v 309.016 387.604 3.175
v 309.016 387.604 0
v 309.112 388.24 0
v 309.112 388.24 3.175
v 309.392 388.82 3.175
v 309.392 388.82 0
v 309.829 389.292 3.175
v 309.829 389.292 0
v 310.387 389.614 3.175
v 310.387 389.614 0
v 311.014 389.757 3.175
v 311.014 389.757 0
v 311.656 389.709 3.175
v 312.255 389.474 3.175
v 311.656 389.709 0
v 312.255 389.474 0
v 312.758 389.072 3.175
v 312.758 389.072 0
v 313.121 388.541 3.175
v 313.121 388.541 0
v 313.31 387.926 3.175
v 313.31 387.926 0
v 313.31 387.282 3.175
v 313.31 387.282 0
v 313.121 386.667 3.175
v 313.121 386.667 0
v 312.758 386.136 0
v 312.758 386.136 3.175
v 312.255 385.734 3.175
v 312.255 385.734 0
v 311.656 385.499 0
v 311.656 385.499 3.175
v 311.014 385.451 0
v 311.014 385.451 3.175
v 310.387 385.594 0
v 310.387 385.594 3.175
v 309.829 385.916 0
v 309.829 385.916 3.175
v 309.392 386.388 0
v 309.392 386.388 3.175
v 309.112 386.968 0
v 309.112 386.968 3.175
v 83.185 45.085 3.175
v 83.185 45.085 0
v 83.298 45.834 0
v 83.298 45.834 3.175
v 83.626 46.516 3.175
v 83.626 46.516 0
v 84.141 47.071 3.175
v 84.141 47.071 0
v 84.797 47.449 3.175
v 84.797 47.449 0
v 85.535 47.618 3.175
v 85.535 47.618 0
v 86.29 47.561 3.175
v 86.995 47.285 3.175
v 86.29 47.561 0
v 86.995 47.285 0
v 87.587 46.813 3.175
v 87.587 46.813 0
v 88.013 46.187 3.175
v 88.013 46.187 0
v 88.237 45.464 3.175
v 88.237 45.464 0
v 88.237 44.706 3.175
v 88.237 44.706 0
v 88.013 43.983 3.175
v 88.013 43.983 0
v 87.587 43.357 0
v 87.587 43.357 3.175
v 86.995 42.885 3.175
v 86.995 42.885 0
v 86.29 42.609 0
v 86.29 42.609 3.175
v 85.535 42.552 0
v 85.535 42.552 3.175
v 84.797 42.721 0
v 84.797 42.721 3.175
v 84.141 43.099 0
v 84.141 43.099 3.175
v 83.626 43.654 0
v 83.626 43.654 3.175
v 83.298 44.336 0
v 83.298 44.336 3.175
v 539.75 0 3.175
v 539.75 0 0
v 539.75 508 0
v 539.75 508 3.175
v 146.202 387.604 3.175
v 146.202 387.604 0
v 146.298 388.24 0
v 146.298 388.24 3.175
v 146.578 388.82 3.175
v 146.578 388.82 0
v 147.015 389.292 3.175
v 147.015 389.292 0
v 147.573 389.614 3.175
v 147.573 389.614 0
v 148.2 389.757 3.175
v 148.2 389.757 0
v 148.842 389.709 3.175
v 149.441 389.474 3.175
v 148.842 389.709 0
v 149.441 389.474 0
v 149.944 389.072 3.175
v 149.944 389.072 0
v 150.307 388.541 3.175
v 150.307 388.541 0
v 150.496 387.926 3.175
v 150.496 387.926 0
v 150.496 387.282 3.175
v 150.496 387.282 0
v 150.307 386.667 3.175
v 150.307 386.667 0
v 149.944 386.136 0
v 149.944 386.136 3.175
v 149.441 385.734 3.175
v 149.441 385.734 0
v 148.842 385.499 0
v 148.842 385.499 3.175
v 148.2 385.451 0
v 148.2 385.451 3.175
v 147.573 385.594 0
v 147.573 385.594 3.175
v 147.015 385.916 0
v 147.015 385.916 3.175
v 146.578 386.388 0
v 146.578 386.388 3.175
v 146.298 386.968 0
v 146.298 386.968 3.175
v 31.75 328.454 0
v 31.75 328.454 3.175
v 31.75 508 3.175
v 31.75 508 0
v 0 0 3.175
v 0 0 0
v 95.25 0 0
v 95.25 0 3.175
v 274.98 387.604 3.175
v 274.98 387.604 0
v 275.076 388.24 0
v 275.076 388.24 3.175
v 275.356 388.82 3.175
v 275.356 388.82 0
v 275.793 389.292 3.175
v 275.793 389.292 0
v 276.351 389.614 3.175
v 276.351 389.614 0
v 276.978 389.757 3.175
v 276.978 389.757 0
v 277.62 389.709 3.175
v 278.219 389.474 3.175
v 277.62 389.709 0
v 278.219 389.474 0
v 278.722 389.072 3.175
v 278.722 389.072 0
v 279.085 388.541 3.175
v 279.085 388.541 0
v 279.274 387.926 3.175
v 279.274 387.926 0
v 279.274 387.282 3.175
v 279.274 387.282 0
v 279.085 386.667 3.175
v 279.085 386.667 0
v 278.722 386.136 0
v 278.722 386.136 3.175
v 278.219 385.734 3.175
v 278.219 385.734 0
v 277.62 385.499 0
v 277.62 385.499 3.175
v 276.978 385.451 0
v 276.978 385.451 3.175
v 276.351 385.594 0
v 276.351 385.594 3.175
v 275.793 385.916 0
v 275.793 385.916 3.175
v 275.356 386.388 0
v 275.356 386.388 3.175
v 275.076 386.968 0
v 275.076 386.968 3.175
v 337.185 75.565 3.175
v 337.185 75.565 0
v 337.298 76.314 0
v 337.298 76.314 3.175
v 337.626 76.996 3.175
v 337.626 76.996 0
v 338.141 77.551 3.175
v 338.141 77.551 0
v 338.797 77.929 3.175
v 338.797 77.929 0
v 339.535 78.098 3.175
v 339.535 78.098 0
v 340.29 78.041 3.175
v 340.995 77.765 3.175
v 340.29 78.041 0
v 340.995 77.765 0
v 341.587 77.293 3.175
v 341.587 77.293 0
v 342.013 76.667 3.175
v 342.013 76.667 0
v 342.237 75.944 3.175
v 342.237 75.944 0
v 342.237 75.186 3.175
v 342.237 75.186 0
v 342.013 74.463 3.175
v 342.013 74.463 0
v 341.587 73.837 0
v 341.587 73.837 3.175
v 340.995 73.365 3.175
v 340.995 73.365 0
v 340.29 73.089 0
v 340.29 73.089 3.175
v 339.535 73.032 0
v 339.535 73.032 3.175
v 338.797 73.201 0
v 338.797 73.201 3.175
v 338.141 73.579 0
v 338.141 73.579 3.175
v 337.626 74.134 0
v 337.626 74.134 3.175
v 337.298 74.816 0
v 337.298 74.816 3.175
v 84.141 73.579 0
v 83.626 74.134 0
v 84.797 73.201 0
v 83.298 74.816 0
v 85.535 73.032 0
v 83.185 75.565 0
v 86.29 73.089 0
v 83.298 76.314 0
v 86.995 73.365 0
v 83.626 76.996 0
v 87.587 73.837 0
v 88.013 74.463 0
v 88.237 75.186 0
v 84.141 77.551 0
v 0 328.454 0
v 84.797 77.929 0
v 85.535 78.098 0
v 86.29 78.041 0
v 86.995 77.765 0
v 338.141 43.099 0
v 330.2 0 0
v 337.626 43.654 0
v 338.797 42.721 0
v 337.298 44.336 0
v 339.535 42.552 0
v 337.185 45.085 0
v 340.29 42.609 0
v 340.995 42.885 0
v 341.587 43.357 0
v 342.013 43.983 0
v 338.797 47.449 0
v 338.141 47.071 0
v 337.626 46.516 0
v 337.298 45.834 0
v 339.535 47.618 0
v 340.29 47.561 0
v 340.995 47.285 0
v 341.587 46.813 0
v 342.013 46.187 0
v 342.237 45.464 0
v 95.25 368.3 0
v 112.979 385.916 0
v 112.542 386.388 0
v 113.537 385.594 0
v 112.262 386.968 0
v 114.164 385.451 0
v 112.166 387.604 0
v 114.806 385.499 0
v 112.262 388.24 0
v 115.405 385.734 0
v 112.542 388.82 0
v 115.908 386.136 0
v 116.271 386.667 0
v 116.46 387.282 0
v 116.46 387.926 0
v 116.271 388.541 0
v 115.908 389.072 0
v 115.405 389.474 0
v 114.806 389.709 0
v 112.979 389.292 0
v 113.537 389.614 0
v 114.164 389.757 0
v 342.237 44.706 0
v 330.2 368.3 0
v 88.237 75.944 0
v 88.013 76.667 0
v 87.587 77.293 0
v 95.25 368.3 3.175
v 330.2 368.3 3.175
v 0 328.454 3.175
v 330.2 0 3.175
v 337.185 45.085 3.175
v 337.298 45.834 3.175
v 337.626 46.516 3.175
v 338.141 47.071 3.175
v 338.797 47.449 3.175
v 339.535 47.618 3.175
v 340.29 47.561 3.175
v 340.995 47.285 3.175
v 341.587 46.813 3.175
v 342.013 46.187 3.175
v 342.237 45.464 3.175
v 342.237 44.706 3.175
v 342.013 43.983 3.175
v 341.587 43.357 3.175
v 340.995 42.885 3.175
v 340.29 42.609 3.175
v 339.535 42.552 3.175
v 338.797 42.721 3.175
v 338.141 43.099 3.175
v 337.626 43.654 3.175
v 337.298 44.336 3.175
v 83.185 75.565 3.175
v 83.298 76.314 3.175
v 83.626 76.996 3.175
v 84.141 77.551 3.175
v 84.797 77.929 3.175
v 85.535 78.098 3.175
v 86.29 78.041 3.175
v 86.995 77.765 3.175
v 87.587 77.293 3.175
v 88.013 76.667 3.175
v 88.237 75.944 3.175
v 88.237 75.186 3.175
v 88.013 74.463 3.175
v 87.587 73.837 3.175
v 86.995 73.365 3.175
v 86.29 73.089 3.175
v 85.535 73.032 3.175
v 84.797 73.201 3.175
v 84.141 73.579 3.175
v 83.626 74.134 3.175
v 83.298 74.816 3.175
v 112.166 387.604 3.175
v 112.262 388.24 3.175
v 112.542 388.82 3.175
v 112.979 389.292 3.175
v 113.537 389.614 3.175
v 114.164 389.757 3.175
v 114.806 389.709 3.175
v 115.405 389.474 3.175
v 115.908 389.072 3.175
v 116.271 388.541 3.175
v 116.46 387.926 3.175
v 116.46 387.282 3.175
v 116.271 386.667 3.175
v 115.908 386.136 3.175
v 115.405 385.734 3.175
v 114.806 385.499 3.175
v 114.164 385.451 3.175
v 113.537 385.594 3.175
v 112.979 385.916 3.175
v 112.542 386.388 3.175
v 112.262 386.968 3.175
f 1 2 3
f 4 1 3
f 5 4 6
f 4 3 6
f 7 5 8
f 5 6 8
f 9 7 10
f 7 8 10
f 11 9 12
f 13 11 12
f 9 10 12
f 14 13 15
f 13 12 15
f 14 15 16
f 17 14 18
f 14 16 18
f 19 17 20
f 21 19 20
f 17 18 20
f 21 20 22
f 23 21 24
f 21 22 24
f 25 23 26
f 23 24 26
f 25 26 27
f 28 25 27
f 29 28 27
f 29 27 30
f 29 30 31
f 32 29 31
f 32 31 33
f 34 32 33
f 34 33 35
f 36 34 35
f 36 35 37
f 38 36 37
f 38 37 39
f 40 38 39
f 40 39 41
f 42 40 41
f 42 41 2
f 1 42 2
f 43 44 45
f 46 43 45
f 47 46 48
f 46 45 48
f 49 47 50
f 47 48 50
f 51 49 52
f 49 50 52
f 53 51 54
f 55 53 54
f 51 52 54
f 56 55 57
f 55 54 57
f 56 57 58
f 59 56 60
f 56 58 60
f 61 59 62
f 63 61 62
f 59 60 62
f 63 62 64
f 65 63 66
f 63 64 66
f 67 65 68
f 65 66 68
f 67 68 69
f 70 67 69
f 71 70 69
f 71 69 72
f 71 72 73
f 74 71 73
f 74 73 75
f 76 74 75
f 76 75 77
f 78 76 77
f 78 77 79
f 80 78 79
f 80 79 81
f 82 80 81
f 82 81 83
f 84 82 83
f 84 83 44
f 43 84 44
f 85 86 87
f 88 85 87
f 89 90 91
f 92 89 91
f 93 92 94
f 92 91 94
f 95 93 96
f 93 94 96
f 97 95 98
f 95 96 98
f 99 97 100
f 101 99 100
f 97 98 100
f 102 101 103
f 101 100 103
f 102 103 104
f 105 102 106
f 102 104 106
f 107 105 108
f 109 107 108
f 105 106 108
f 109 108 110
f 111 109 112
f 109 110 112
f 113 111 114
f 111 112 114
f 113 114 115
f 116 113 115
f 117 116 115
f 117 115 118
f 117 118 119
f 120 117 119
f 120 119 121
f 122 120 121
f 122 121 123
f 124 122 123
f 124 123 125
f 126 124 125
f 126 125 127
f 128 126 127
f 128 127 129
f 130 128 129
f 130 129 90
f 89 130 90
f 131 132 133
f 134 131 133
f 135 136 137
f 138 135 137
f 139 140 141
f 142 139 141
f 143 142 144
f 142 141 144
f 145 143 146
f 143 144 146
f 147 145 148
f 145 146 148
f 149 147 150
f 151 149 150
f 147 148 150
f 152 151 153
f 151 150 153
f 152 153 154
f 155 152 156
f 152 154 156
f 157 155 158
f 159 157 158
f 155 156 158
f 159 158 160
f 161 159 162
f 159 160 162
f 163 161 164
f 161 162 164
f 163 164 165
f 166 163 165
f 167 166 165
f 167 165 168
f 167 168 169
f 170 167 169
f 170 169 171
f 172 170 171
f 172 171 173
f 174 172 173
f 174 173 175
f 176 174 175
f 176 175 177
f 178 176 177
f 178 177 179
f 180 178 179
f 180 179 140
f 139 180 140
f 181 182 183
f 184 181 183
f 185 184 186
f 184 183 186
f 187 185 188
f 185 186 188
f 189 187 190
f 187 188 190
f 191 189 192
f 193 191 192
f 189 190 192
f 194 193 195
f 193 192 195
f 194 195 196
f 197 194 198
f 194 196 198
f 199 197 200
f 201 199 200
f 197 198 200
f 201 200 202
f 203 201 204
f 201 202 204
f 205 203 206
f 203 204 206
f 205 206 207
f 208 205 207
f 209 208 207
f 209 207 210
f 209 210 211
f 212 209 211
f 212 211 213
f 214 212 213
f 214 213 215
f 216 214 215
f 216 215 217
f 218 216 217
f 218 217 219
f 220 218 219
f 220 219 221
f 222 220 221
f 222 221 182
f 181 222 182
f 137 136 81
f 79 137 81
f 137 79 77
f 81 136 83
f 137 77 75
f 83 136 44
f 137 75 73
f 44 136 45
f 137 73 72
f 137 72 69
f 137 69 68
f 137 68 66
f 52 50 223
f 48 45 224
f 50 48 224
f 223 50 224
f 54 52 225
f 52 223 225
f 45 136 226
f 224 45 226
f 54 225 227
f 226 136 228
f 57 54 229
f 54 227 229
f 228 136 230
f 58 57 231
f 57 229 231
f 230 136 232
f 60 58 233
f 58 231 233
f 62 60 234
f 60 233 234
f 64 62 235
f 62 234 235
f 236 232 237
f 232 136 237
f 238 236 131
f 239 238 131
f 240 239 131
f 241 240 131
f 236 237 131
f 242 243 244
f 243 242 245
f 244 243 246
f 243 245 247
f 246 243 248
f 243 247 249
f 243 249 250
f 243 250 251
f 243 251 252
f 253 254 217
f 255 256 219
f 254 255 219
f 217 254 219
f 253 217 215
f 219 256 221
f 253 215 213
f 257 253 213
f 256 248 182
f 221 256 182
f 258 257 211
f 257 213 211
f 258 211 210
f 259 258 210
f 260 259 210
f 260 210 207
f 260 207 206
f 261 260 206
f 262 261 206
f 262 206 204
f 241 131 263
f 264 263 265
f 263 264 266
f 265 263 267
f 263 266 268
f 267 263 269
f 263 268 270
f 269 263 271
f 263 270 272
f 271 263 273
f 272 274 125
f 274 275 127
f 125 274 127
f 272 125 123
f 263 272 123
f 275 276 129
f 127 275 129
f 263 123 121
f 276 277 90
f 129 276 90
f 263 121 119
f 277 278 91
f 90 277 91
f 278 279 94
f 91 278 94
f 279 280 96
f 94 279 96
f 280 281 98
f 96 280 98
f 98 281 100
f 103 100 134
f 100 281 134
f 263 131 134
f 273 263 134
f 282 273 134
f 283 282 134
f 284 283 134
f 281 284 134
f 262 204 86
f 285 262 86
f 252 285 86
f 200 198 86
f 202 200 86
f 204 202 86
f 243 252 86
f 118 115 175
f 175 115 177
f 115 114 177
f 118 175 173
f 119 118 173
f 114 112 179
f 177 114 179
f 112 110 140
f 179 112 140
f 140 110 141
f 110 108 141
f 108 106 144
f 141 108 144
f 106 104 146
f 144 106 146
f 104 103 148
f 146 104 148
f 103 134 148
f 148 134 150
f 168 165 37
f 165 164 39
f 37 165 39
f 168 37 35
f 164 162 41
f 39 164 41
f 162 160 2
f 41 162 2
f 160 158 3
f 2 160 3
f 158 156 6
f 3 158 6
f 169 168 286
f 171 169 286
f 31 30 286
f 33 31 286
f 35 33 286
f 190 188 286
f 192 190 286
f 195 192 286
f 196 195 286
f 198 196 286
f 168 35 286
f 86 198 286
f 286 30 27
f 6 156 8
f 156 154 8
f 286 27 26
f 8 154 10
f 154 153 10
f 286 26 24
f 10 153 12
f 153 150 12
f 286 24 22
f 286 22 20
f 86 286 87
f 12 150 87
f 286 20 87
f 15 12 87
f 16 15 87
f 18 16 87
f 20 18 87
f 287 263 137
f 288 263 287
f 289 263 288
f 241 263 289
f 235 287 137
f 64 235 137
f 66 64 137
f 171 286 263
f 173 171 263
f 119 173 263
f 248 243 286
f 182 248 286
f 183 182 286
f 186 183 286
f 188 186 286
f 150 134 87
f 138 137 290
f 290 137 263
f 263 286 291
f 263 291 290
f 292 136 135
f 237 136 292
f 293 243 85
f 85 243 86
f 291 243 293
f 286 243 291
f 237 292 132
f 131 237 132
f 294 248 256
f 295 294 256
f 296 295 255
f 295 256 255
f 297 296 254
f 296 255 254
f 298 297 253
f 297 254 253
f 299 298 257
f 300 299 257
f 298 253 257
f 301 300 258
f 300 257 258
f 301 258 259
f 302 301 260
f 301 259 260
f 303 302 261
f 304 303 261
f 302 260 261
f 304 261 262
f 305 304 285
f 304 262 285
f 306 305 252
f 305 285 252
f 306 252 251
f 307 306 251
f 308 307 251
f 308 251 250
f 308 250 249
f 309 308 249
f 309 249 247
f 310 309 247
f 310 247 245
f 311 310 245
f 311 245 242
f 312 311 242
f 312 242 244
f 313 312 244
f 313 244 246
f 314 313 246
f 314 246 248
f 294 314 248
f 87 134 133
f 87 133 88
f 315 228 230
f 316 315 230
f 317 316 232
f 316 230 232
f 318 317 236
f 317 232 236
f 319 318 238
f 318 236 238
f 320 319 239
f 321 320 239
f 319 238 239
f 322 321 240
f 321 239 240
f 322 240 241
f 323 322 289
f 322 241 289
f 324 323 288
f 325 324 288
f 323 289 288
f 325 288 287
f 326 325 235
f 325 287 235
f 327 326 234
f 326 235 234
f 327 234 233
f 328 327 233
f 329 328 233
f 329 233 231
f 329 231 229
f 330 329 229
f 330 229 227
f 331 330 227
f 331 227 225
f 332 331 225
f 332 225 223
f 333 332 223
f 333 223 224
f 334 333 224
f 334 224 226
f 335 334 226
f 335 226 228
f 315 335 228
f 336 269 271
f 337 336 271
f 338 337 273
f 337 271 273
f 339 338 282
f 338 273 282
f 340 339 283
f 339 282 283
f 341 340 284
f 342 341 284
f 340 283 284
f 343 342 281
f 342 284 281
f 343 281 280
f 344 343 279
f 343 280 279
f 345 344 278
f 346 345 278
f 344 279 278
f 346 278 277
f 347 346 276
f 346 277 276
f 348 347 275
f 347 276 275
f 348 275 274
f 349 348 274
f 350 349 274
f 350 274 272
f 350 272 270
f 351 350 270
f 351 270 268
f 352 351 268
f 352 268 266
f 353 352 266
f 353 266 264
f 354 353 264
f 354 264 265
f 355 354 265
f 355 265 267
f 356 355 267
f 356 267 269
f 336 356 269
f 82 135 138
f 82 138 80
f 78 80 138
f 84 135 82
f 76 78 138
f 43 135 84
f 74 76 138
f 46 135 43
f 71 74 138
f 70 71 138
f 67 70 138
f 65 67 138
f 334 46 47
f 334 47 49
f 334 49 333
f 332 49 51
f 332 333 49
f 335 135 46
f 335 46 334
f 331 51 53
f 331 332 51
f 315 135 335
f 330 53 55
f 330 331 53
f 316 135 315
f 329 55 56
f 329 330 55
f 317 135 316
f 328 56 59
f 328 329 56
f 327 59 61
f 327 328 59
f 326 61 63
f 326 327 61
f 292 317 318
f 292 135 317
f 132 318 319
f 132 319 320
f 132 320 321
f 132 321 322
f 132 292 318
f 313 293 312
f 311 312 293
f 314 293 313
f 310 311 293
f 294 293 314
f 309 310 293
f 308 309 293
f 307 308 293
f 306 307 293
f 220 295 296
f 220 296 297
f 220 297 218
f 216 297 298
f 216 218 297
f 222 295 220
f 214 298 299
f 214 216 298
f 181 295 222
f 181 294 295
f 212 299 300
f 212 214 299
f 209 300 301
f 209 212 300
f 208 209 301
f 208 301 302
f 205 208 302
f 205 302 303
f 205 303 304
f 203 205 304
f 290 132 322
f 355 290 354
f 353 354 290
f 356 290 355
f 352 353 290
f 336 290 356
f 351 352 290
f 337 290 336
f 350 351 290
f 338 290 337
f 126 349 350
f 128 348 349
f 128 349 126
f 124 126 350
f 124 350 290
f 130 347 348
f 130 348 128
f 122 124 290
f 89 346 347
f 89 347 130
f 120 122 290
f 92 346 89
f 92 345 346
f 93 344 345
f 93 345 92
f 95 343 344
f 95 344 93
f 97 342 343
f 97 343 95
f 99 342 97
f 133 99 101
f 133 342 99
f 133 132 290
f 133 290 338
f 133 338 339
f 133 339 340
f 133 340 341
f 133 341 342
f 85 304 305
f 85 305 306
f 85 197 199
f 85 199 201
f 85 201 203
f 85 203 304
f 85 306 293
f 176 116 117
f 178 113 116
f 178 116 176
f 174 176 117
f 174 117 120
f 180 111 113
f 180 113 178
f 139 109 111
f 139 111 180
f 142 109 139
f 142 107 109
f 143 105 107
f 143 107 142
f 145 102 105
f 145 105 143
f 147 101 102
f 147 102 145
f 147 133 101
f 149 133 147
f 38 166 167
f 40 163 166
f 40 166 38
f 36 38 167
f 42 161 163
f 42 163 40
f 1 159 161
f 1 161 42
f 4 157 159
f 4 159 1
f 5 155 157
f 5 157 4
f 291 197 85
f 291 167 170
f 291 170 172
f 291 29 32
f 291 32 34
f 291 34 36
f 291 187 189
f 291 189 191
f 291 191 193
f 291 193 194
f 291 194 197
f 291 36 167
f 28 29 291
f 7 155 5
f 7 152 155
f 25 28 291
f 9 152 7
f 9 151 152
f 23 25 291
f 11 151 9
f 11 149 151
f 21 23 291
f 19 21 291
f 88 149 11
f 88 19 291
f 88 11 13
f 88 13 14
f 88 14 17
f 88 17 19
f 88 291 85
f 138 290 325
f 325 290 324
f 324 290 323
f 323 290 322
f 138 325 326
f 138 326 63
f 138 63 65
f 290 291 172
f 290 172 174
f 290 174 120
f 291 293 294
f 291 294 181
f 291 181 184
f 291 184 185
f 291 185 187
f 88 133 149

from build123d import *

# Parameters (mm, degrees)
SKETCH1_W           = 539.75
SKETCH1_H           = 508
BOSS_EXTRUDE1_DEPTH = 3.175
SKETCH2_R           = 2.54
SKETCH2_R_2         = 3.175
SKETCH2_W           = 234.95
SKETCH2_H           = 368.3
CUT_EXTRUDE1_DEPTH  = 44.45
SKETCH4_R           = 2.159
CUT_EXTRUDE3_DEPTH  = 742.218013222
CUT_EXTRUDE4_DEPTH  = 742.218013222


with BuildPart() as part:
    # Sketch1 → Boss-Extrude1 (new body)
    with BuildSketch(Plane.XY):
        with Locations((269.875, 254)):
            Rectangle(SKETCH1_W, SKETCH1_H)
    extrude(amount=BOSS_EXTRUDE1_DEPTH)

    # Sketch2 → Cut-Extrude1 (cut)
    with BuildSketch(Plane(origin=(0, 0, 0), x_dir=(-1, 0, 0), z_dir=(0, 0, -1))):
        with Locations((-339.725, 45.085)):
            Circle(SKETCH2_R)
        with Locations((-85.725, 45.085)):
            Circle(SKETCH2_R)
        with Locations((-15.24, 365.76)):
            Circle(SKETCH2_R_2)
        with Locations((-339.725, 75.565)):
            Circle(SKETCH2_R)
        with Locations((-85.725, 75.565)):
            Circle(SKETCH2_R)
        with Locations((-212.725, 184.15)):
            Rectangle(SKETCH2_W, SKETCH2_H)
    extrude(amount=-CUT_EXTRUDE1_DEPTH, mode=Mode.SUBTRACT)

    # Sketch4 → Cut-Extrude3 (cut, through all)
    with BuildSketch(Plane(origin=(0, 0, 0), x_dir=(-1, 0, 0), z_dir=(0, 0, -1))):
        with Locations((-311.1754, 387.604)):
            Circle(SKETCH4_R)
        with Locations((-277.1394, 387.604)):
            Circle(SKETCH4_R)
        with Locations((-148.3614, 387.604)):
            Circle(SKETCH4_R)
        with Locations((-114.3254, 387.604)):
            Circle(SKETCH4_R)
    extrude(amount=-CUT_EXTRUDE3_DEPTH, mode=Mode.SUBTRACT)

    # Sketch5 → Cut-Extrude4 (cut, through all)
    with BuildSketch(Plane.XY.offset(3.175)):
        Polygon((0, 403.06625), (0, 328.45375), (31.75, 328.45375), (31.75, 403.06625), (31.75, 508), (0, 508), align=None)
    extrude(amount=-CUT_EXTRUDE4_DEPTH, mode=Mode.SUBTRACT)


solid = part.part
